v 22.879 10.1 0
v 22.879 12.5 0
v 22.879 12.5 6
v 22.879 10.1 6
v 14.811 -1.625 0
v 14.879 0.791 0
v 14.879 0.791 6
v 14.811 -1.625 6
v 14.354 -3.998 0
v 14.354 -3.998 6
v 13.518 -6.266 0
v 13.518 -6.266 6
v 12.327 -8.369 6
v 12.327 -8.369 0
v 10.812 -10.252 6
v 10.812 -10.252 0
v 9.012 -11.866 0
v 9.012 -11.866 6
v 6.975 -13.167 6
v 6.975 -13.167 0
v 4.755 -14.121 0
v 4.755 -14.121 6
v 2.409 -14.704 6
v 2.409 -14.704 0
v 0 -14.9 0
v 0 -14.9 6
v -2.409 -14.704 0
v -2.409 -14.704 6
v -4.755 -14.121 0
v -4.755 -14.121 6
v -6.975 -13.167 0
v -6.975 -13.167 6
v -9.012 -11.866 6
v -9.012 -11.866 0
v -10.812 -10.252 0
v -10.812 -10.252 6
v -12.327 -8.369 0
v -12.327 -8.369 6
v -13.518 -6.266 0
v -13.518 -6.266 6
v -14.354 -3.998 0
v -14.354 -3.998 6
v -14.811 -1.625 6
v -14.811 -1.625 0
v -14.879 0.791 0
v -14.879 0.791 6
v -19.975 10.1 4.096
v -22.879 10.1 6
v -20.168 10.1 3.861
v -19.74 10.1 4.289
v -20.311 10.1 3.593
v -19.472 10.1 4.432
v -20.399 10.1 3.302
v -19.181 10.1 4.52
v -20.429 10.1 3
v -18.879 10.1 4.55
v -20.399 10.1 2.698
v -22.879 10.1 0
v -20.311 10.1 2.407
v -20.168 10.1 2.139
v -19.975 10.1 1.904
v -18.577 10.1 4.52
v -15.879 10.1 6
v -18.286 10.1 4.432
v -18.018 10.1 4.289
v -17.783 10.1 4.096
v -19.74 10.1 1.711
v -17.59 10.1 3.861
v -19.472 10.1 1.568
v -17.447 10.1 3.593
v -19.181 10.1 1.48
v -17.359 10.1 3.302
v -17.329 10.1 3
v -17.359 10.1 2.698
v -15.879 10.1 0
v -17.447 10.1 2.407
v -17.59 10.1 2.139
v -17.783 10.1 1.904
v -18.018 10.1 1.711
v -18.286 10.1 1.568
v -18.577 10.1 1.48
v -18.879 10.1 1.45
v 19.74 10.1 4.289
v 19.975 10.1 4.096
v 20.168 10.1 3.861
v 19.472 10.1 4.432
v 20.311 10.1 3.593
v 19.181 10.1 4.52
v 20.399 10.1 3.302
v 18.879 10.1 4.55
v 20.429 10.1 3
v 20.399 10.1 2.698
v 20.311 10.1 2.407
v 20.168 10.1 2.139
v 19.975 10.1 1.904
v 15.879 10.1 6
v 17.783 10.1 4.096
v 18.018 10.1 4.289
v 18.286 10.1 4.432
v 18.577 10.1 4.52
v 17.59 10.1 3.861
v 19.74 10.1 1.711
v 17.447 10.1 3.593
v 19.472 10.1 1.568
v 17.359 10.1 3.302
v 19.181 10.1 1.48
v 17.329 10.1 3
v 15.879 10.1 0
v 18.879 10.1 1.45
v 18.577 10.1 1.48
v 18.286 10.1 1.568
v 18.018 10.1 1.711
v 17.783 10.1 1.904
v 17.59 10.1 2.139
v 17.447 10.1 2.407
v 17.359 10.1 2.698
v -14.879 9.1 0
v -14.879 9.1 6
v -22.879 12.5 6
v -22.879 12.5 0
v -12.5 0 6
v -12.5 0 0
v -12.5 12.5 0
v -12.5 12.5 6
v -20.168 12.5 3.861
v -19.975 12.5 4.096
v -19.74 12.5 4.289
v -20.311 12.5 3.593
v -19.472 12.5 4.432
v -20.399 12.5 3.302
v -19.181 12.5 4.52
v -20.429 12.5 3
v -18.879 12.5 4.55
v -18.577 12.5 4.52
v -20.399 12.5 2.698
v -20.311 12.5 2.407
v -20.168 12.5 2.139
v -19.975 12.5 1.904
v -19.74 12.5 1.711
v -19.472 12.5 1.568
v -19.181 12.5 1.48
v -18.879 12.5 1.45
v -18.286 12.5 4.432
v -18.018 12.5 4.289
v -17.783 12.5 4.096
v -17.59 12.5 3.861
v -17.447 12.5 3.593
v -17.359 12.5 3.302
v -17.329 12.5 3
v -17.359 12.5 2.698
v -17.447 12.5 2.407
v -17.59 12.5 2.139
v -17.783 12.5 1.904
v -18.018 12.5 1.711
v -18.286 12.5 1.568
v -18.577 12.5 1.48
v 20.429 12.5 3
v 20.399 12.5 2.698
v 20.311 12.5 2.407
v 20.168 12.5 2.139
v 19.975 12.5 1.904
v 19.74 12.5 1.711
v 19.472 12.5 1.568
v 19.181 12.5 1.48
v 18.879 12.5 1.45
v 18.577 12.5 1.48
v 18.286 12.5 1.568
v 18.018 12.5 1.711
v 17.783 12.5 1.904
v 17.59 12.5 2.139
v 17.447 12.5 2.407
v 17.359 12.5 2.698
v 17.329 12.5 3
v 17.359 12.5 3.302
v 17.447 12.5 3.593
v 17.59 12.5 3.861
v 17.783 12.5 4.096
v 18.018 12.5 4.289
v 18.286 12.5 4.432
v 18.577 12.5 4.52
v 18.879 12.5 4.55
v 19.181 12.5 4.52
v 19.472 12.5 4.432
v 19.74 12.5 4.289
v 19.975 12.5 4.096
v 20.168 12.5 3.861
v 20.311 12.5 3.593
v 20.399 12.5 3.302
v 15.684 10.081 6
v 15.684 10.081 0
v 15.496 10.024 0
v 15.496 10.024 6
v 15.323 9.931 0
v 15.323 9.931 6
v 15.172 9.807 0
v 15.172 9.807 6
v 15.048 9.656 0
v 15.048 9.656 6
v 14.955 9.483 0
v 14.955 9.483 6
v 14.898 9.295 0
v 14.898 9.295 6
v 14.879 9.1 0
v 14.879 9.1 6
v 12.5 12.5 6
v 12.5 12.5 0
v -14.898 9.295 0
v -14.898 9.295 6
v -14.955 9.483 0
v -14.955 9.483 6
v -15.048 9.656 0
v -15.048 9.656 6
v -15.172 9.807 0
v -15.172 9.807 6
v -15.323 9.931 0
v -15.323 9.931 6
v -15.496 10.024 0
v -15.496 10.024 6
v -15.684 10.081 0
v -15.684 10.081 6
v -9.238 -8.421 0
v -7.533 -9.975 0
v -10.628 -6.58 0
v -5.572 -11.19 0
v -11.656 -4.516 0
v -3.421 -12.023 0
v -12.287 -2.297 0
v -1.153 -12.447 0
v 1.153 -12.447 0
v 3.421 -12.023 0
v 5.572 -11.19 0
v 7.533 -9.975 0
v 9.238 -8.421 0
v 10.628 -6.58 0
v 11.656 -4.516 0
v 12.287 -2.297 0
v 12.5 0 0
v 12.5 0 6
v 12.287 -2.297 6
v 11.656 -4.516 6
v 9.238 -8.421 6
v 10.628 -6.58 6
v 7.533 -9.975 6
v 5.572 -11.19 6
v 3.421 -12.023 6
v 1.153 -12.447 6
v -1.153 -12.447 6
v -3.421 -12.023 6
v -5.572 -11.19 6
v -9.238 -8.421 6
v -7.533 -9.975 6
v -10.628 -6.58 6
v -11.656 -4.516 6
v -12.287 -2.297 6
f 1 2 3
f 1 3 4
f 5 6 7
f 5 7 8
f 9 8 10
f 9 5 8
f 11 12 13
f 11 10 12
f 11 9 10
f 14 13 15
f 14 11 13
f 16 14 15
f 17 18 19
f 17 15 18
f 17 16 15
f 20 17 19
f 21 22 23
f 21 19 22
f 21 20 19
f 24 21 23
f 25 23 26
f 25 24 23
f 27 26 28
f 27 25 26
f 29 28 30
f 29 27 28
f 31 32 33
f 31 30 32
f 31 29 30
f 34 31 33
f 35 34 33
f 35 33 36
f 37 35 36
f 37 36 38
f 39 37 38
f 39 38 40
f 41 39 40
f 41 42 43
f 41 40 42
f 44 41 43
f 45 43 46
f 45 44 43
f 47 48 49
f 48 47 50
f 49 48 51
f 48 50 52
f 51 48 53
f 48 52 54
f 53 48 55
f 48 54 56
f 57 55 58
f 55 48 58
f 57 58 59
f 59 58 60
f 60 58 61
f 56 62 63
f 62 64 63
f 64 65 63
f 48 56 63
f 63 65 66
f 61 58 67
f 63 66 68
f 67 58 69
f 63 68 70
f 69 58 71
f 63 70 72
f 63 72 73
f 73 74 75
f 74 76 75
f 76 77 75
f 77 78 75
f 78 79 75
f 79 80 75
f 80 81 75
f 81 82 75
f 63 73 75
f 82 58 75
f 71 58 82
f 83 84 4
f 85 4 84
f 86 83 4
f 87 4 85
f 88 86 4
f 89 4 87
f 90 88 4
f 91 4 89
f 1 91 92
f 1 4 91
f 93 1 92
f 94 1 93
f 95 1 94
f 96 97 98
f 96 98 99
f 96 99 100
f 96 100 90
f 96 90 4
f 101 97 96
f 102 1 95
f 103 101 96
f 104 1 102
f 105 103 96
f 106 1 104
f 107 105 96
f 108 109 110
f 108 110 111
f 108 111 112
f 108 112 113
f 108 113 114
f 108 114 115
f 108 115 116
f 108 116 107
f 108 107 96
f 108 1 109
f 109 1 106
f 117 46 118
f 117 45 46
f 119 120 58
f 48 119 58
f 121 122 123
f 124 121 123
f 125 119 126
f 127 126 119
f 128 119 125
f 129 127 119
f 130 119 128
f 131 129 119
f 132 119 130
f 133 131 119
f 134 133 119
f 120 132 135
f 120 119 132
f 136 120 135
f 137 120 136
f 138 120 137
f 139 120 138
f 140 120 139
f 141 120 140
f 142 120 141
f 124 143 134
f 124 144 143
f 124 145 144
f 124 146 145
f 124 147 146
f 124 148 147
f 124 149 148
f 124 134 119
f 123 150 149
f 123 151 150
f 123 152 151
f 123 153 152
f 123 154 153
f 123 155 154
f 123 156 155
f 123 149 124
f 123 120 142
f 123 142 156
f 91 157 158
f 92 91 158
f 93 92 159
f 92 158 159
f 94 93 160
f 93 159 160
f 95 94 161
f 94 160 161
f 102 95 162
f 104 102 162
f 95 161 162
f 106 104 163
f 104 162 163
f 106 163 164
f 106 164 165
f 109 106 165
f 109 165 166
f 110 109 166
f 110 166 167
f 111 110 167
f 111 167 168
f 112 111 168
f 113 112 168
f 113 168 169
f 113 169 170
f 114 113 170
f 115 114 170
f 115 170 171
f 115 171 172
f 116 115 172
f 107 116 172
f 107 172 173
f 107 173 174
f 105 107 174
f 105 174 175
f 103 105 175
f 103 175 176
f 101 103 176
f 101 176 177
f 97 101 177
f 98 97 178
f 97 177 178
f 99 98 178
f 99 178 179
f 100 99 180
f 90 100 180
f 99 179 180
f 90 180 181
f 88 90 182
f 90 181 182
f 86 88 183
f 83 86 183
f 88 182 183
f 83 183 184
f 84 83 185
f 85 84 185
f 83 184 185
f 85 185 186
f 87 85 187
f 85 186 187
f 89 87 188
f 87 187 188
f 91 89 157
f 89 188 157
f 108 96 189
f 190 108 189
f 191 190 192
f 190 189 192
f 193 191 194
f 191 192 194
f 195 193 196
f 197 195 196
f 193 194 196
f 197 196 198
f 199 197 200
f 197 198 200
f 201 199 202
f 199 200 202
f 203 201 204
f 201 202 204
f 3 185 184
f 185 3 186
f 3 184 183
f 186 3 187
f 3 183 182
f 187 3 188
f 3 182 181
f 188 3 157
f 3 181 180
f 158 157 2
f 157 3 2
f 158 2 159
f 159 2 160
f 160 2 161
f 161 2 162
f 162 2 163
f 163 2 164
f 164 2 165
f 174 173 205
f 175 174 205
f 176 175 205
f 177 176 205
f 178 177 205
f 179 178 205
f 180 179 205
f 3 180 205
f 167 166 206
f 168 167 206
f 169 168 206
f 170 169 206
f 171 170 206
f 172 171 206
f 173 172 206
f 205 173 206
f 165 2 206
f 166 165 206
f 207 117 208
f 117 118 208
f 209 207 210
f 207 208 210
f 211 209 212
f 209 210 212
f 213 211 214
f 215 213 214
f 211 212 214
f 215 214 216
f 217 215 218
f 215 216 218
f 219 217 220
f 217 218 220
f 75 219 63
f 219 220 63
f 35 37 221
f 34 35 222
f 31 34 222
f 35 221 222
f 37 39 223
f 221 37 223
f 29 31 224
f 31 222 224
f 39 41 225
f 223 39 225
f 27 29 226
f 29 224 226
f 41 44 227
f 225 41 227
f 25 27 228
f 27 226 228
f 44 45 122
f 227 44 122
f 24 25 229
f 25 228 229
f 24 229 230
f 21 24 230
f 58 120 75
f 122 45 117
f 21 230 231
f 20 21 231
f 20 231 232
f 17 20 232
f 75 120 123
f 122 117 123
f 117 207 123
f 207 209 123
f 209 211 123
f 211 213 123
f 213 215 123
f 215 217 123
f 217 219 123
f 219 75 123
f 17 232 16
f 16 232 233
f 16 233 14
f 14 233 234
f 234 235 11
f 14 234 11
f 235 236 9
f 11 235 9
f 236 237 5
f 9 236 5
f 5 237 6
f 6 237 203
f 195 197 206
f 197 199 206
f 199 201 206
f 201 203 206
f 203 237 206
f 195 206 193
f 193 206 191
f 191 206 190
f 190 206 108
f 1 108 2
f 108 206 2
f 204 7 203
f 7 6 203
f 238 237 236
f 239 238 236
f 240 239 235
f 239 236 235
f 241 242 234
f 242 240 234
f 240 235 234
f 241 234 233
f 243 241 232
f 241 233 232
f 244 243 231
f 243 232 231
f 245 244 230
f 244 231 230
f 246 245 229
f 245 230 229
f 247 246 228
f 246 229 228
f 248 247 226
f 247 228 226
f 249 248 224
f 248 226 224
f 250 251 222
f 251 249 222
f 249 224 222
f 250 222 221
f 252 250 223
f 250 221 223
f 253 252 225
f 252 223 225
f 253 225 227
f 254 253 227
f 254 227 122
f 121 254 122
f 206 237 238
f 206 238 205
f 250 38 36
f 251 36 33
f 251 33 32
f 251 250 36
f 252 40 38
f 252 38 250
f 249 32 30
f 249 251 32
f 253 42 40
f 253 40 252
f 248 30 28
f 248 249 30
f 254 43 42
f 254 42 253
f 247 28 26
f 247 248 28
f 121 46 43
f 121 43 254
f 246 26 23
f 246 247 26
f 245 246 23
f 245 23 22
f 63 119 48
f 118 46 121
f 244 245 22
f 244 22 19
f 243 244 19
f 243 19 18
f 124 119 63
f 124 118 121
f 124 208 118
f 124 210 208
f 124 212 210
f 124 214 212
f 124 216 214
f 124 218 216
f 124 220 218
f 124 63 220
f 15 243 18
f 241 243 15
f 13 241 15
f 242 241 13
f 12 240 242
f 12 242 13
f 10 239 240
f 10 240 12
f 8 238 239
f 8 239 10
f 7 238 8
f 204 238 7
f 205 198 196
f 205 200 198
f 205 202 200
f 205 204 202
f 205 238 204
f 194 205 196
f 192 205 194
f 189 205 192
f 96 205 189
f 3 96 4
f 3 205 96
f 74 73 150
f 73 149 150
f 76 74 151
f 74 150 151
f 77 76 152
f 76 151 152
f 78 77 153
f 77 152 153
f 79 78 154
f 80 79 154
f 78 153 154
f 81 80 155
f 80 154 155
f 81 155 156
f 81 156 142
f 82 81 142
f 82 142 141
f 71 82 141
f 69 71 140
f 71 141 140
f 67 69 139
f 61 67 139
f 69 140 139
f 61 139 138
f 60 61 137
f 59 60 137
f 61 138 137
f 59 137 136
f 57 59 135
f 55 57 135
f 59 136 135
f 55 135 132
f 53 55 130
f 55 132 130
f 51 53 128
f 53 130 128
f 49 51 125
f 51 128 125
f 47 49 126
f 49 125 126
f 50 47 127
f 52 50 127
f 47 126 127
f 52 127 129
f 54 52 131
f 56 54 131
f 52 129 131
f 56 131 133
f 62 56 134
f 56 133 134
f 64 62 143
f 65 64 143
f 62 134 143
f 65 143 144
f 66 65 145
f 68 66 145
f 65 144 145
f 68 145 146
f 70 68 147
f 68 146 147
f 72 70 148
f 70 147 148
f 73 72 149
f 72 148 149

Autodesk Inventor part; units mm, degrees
ref_plane "YZ Plane" through (0, 0, 0) normal (1, 0, 0) x (0, 1, 0)
ref_plane "XZ Plane" through (0, 0, 0) normal (0, 1, 0) x (-1, 0, 0)
ref_plane "XY Plane" through (0, 0, 0) normal (0, 0, 1) x (1, 0, 0)
sketch "Sketch1" plane through (0, 0, 0) normal (0, 0, 1) x (1, 0, 0)
  arc A0 (-12.5, 0) -> (12.5, 0) centre (0, 0) ccw
  line L0 (-12.5, 0) -> (-12.5, 12.5)
  line L1 (12.5, 0) -> (12.5, 12.5)
  arc A1 (-14.879, 0.7912) -> (14.879, 0.7912) centre (0, 0) ccw
  line L2 (-14.879, 0.7912) -> (-14.879, 10.1)
  line L3 (14.879, 0.7912) -> (14.879, 10.1)
  line L4 (-22.879, 12.5) -> (-22.879, 10.1)
  line L5 (-22.879, 10.1) -> (-14.879, 10.1)
  line L6 (-22.879, 12.5) -> (-12.5, 12.5)
  line L7 (22.879, 12.5) -> (22.879, 10.1)
  line L8 (22.879, 10.1) -> (14.879, 10.1)
  line L9 (22.879, 12.5) -> (12.5, 12.5)
extrude "Extrusion1" add sketch "Sketch1" along normal blind 6
sketch "Sketch2" plane through (12.5, 12.5, 0) normal (0, 1, 0) x (1, 0, 0)
  line L0 (-35.379, 0) -> (-35.379, -6) projected
  circle A0 centre (-31.379, -3) radius 1.55
  circle A1 centre (6.379, -3) radius 1.55
  line L1 (10.379, 0) -> (10.379, -6) projected
  point P0 (-12.5, 0)
  dimension "d16" = 3.1
extrude "Extrusion2" cut sketch "Sketch2" against normal blind 10
fillet "Fillet1" radius 1 1 edges at (14.879, 10.1, 3)
fillet "Fillet2" radius 1 1 edges at (-14.879, 10.1, 3)
properties part number "motor_support"
